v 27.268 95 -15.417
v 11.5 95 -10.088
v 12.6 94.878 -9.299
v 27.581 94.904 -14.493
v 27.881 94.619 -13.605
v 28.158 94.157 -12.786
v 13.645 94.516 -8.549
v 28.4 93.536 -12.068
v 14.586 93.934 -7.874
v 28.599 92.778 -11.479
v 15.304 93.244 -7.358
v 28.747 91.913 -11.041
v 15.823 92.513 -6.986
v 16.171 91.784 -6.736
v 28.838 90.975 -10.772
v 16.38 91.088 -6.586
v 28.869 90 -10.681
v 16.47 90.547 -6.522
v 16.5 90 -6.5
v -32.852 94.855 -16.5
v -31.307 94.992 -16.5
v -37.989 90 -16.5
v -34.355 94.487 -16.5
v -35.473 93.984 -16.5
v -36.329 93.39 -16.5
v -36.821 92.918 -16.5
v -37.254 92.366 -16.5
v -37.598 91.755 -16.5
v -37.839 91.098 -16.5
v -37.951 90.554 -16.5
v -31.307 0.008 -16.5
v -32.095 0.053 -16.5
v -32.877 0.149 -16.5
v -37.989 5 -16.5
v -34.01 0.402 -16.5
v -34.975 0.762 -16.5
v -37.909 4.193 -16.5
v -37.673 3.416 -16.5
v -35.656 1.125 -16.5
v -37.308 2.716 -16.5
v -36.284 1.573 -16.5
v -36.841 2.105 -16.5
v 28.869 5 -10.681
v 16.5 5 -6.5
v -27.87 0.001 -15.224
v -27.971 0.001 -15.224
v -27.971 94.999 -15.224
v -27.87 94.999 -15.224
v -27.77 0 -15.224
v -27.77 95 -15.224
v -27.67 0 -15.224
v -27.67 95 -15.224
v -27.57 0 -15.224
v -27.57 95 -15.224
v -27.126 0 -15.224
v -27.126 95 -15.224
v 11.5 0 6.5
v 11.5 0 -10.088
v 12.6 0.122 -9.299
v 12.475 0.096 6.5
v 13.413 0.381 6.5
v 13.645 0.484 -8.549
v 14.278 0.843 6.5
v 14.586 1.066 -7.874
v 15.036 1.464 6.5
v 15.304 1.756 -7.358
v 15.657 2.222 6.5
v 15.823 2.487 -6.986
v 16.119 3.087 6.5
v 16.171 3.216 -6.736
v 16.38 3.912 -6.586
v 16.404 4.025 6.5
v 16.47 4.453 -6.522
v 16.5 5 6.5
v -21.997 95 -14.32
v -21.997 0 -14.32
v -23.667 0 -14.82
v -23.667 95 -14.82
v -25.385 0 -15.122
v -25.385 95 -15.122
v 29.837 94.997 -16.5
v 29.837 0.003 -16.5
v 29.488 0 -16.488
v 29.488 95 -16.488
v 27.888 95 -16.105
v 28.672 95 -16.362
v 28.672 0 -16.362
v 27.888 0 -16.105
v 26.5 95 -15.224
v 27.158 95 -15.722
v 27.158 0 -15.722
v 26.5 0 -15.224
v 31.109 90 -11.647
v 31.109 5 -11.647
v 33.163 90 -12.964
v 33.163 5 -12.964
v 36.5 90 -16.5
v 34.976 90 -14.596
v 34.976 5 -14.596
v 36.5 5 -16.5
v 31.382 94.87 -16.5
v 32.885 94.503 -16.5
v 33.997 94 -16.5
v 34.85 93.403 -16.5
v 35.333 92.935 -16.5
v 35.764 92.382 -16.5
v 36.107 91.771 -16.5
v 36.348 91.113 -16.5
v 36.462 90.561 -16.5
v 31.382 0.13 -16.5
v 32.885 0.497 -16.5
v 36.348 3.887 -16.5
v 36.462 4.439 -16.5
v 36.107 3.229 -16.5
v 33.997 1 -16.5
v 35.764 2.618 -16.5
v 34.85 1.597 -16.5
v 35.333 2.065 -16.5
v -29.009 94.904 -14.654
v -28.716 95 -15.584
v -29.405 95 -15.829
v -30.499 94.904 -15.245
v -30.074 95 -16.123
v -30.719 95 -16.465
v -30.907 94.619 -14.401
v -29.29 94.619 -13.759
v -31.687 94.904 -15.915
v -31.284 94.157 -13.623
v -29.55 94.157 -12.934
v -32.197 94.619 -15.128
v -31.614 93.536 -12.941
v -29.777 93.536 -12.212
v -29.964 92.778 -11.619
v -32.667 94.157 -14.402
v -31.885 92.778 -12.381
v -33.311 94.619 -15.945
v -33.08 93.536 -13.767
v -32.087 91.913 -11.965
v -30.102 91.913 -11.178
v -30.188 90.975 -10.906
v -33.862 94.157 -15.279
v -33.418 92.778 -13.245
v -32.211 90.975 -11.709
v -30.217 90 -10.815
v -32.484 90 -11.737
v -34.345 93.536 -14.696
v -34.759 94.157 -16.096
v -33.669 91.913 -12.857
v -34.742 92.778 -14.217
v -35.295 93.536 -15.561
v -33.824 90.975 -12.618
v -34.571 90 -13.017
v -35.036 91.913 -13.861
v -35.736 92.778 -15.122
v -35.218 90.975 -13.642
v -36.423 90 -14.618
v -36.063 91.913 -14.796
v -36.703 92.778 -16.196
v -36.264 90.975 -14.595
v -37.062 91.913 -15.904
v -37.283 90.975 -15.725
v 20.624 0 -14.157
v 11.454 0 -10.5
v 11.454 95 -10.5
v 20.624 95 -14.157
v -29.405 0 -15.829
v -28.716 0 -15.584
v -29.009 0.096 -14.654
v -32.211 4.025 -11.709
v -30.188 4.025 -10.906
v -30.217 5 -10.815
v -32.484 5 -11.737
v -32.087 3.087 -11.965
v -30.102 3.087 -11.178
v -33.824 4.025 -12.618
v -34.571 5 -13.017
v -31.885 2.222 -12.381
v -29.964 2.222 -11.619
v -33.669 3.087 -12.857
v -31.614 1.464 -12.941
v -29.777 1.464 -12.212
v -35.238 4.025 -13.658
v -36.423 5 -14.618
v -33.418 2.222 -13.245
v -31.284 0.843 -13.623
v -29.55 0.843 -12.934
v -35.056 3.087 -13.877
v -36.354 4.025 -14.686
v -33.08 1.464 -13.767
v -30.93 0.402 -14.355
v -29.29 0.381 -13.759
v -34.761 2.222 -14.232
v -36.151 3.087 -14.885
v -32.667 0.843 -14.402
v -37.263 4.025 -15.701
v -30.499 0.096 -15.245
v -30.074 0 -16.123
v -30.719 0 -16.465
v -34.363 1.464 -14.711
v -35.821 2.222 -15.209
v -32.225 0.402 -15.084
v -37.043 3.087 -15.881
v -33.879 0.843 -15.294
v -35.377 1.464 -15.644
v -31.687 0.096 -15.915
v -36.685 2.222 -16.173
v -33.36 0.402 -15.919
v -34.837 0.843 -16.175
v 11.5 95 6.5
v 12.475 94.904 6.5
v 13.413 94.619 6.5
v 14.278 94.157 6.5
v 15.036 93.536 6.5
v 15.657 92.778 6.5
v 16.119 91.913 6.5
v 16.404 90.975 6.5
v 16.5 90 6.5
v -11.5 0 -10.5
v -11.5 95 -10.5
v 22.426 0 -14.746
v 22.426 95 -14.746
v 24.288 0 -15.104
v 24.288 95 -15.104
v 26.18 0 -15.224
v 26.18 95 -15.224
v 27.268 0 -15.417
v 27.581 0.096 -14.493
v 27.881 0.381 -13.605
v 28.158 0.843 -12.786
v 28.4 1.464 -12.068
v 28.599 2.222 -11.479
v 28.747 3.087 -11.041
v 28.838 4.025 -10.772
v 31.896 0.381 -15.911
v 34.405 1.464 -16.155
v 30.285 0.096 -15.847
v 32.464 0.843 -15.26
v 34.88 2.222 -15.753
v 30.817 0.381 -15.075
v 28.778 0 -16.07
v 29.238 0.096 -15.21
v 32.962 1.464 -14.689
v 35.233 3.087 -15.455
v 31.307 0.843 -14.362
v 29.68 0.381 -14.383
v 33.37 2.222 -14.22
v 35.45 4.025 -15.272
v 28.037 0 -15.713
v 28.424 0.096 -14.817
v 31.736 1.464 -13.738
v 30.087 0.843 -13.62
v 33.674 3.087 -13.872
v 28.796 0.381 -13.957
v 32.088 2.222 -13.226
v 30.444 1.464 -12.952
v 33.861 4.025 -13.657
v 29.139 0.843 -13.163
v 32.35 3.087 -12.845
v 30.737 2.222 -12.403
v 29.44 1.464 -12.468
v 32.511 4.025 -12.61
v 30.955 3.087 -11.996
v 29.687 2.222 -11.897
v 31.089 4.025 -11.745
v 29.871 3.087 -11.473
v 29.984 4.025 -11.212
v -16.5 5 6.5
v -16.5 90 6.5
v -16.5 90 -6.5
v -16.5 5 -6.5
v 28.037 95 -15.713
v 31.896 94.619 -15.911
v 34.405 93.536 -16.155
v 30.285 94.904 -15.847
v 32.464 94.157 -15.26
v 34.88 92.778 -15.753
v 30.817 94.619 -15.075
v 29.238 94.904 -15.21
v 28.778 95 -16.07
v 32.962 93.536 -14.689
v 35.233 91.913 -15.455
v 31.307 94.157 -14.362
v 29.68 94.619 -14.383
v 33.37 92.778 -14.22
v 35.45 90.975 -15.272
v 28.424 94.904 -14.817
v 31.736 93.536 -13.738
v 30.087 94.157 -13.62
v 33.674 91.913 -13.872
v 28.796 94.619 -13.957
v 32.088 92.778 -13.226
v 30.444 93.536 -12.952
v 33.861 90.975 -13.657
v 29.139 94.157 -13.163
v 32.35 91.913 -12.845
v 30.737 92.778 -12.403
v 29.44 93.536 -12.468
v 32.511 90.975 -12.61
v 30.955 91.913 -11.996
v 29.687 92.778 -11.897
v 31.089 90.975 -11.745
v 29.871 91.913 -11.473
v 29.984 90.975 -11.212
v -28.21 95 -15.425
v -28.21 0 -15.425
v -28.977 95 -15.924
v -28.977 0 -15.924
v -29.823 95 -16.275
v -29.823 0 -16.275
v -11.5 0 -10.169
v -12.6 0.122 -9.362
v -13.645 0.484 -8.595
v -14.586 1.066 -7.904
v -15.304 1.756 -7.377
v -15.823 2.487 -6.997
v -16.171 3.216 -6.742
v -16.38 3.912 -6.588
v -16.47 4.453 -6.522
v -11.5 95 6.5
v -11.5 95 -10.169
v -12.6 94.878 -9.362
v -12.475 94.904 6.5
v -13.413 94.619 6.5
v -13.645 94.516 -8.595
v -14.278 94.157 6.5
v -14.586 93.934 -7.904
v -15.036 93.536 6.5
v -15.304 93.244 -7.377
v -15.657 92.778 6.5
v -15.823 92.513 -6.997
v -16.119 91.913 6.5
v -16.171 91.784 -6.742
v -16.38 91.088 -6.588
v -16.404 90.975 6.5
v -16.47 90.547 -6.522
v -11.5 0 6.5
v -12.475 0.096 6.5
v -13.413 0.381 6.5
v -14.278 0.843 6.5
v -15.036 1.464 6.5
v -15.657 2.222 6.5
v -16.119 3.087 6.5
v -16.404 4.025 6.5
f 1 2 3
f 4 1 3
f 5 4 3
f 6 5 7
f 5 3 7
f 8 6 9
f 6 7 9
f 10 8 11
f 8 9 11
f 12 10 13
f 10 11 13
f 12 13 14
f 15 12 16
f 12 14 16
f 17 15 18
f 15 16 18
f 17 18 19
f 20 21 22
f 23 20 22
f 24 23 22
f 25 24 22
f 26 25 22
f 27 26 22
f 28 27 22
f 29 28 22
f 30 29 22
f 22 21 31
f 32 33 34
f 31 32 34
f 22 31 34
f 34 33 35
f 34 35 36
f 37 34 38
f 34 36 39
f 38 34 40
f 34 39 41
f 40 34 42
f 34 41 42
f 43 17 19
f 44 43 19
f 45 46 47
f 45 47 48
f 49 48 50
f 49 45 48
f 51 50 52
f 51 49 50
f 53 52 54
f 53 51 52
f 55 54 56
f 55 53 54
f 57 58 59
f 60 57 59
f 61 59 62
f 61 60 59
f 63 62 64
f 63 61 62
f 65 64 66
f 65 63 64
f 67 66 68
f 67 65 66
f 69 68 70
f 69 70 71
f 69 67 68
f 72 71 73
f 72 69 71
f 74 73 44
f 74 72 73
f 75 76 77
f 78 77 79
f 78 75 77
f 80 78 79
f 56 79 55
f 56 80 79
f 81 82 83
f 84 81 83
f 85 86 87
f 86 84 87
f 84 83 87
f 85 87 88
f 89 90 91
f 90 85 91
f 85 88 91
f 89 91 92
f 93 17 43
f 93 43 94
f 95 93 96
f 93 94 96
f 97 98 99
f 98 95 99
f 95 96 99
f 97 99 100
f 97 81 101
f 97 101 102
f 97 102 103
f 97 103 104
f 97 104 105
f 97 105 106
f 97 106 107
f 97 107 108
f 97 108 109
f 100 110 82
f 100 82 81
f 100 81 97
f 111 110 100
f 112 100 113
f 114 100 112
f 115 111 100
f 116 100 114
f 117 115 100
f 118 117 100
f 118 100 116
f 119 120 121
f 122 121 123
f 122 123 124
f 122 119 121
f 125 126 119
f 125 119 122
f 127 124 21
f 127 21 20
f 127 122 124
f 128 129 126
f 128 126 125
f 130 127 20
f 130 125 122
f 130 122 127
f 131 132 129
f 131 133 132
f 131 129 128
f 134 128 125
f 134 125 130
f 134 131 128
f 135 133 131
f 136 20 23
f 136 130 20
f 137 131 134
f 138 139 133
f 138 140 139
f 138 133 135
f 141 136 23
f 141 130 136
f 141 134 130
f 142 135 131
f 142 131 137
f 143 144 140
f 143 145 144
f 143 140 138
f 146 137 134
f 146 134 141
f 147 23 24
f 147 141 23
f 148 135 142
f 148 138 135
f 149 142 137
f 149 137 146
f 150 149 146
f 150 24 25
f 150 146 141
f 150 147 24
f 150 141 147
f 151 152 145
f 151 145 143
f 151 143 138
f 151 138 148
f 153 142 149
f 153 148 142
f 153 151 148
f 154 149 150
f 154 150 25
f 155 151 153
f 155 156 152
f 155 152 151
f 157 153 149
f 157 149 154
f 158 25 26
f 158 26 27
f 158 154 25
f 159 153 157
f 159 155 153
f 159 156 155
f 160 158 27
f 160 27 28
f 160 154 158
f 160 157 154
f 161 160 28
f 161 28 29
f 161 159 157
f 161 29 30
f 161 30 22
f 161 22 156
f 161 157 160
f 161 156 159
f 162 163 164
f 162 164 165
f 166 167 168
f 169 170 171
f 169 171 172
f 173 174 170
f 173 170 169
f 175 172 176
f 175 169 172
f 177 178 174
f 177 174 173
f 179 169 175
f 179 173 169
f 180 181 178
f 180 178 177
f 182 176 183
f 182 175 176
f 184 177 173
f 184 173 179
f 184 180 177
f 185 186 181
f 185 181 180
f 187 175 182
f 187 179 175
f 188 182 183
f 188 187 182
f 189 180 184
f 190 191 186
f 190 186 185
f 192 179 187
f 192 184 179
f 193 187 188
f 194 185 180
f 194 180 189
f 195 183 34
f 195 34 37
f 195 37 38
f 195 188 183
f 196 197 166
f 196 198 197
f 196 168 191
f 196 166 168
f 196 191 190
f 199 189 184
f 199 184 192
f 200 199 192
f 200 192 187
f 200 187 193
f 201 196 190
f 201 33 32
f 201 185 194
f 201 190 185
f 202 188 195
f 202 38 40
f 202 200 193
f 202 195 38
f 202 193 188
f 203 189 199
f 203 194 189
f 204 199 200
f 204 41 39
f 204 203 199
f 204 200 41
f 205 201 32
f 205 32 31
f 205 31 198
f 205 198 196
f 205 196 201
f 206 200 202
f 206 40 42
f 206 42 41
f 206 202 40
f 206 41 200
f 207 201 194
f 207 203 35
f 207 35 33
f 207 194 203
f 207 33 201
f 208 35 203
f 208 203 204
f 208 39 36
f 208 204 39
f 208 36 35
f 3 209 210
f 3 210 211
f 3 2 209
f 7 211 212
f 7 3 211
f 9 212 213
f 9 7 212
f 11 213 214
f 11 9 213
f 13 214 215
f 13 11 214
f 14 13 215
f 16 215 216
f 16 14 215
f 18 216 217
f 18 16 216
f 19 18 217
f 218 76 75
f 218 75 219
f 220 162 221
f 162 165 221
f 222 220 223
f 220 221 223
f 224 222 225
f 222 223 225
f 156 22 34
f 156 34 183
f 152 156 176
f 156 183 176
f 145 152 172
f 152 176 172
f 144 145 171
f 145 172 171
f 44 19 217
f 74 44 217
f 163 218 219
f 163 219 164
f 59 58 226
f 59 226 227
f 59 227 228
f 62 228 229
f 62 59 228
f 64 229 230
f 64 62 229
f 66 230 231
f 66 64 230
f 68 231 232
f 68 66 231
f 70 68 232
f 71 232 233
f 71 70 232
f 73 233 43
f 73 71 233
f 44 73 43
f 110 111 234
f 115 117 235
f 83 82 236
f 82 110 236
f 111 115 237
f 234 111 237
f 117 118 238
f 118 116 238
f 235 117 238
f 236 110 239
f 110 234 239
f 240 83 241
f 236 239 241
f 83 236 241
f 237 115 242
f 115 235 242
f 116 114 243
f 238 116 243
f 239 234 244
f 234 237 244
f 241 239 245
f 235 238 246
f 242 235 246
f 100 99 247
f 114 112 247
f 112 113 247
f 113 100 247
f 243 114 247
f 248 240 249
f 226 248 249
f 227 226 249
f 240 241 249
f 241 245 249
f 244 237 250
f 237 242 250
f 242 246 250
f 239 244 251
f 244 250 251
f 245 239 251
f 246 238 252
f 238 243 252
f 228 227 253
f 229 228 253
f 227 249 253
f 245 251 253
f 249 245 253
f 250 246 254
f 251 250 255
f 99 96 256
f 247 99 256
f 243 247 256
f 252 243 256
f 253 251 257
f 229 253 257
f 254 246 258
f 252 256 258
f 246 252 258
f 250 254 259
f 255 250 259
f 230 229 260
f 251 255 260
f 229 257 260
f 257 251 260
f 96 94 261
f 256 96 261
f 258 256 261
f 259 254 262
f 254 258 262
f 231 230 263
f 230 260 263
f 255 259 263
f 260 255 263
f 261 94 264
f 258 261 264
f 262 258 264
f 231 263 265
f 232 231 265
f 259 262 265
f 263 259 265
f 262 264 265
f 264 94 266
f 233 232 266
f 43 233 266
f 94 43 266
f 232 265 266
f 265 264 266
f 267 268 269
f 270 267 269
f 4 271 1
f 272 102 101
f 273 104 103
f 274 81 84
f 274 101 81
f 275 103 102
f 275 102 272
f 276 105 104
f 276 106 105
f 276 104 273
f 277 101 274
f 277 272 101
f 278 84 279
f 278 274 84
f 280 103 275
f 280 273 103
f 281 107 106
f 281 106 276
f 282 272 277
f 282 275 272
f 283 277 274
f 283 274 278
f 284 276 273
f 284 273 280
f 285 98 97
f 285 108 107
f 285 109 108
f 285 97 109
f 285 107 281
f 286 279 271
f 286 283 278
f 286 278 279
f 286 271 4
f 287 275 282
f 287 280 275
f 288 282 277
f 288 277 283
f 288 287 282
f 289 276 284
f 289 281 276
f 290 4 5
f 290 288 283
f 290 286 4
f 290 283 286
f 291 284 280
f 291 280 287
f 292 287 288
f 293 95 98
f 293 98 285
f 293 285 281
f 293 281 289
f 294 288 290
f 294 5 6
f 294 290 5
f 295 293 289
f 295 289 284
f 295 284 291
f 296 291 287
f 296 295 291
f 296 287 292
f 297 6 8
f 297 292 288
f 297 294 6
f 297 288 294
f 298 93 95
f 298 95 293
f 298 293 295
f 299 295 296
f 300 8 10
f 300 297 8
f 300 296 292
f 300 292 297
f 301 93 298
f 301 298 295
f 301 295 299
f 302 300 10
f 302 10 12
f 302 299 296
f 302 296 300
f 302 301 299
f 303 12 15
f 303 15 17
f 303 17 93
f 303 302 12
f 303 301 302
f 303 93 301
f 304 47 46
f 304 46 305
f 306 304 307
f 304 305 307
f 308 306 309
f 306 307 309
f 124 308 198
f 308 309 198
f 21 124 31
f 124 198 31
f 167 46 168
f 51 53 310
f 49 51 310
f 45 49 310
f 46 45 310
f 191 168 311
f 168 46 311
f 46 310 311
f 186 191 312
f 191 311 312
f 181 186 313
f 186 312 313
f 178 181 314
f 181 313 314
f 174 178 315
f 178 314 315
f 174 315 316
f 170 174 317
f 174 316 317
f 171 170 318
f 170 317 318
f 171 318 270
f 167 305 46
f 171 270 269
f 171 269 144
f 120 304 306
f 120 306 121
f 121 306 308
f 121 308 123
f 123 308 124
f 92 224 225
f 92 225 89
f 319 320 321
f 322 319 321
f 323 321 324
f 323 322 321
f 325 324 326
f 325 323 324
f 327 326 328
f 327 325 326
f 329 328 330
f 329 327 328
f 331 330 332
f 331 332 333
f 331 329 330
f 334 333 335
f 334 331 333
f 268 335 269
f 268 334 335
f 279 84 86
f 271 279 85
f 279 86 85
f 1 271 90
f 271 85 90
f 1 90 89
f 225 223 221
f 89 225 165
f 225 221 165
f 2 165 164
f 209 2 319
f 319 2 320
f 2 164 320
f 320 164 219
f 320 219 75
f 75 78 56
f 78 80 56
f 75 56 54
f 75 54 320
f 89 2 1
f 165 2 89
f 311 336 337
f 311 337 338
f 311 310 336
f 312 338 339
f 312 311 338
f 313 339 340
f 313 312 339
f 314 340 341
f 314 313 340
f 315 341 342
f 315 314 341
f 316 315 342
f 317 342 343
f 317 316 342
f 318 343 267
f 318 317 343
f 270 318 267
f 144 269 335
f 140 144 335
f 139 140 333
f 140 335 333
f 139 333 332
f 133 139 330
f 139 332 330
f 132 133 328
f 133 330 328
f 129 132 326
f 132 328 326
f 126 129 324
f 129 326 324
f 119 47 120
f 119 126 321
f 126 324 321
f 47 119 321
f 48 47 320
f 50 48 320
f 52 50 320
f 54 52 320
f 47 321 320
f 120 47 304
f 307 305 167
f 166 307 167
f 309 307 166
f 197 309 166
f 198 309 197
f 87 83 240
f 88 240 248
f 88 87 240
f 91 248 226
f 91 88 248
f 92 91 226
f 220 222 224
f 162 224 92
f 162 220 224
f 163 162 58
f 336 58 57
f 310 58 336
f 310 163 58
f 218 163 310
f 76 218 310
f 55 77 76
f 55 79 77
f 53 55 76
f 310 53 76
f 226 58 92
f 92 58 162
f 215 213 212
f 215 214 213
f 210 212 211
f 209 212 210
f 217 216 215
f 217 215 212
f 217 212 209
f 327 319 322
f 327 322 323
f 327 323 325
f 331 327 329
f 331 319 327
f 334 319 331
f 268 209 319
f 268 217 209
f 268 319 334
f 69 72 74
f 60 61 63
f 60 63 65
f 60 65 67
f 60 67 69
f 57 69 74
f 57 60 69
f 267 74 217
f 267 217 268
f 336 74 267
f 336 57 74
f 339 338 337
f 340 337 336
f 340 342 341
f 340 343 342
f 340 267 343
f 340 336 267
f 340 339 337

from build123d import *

# Parameters (mm, degrees)
BOSS_EXTRUDE5_DEPTH = 95
FILLET16_R          = 15
FILLET17_R          = 15
FILLET18_R          = 15
FILLET19_R          = 15
FILLET21_R          = 5
FILLET22_R          = 5
FILLET23_R          = 5
FILLET24_R          = 5
FILLET25_R          = 5
FILLET26_R          = 5
FILLET28_R          = 5
FILLET29_R          = 5
FILLET30_R          = 5
FILLET31_R          = 5


with BuildPart() as part:
    # Sketch2 → Boss-Extrude5 (new body)
    with BuildSketch(Plane(origin=(0, 0, 0), x_dir=(1, 0, 0), z_dir=(0, 1, 0))):
        Polygon((-11.5, 10.5), (11.453517933, 10.5), (23.299541019, 15.223771191), (26.5, 15.223771191), (26.5, 16.5), (36.5, 16.5), (36.5, 13.259608353), (16.5, 6.5), (16.5, -6.5), (-16.5, -6.5), (-16.5, 6.5), (-37.988921901, 13.259608353), (-37.988921901, 16.5), (-27.988921901, 16.5), (-27.970531324, 16.5), (-27.970531324, 16.440454109), (-27.970531324, 15.223771191), (-24.481649041, 15.223771191), align=None)
    extrude(amount=BOSS_EXTRUDE5_DEPTH)

    # Fillet16
    # the kernel refuses this fillet: 15 mm, written as the material it takes off along each edge
    with BuildSketch(Plane(origin=(36.5, -20.136972883, -13.259608353), x_dir=(-0.9473542933434234, 0, 0.3201871997500573), z_dir=(0, 1, 0))) as fillet16_piece_1:
        with BuildLine():
            CenterArc((8.054789153, -15), FILLET16_R, 90, 37.311981857)
            Line((-1.037531927, -3.069798938), (-1.219378349, -2.831194917))
            ThreePointArc((-1.219378349, -2.831194917), (-0.802972252, -1.438843309), (-0.284206288, 0.09605616))
            Line((-0.284206288, 0.09605616), (0, 0.3))
            Line((0, 0.3), (8.054789153, 0.3))
            Line((8.054789153, 0.3), (8.054789153, 0))
        make_face()
    extrude(amount=135.273945765, mode=Mode.SUBTRACT)

    # Fillet17
    # the kernel refuses this fillet: 15 mm, written as the material it takes off along each edge
    with BuildSketch(Plane(origin=(-37.988921901, -20.369568994, -13.259608353), x_dir=(0, 0, -1), z_dir=(0, 1, 0))) as fillet17_piece_1:
        with BuildLine():
            CenterArc((11.863879582, -12.273363672), FILLET17_R, 125.092573115, 37.445808138)
            Line((-2.444893018, -7.772360819), (-2.73106847, -7.682340761))
            Line((-2.73106847, -7.682340761), (-0.286175452, 0.090020057))
            Line((-0.286175452, 0.090020057), (0, 0.3))
            ThreePointArc((0, 0.3), (1.620195823, 0.3), (3.067921888, 0.245467273))
            Line((3.067921888, 0.245467273), (3.240391647, 0))
        make_face()
    extrude(amount=135.739137989, mode=Mode.SUBTRACT)

    # Fillet18
    fillet18_edges = [part.edges().sort_by_distance(p)[0] for p in [
        (23.299541019, 47.5, -15.223771191),
    ]]
    fillet(fillet18_edges, radius=FILLET18_R)

    # Fillet19
    fillet19_edges = [part.edges().sort_by_distance(p)[0] for p in [
        (-24.481649041, 47.5, -15.223771191),
    ]]
    fillet(fillet19_edges, radius=FILLET19_R)

    # Fillet21
    # the kernel refuses this fillet: 5 mm, written as the material it takes off along each edge
    with BuildSketch(Plane(origin=(26.5, -8.341735474, -16.5), x_dir=(0, 0, 1), z_dir=(0, 1, 0))) as fillet21_piece_1:
        with BuildLine():
            CenterArc((5, 3.33669419), FILLET21_R, 180, 41.862005804)
            Line((0, 3.33669419), (-0.1, 3.33669419))
            Line((-0.1, 3.33669419), (-0.1, 0))
            Line((-0.1, 0), (0, -0.1))
            ThreePointArc((0, -0.1), (0.638114404, -0.1), (1.201753385, -0.066733884))
            Line((1.201753385, -0.066733884), (1.276228809, 0))
        make_face()
    extrude(amount=111.683470949, mode=Mode.SUBTRACT)

    # Fillet22
    # the kernel refuses this fillet: 5 mm, written as the material it takes off along each edge
    with BuildSketch(Plane(origin=(-27.970531324, -8.341735474, -16.5), x_dir=(0, 0, 1), z_dir=(0, 1, 0))) as fillet22_piece_1:
        with BuildLine():
            CenterArc((5, -3.33669419), FILLET22_R, 138.137994196, 41.862005804)
            Line((0, -3.33669419), (-0.1, -3.33669419))
            Line((-0.1, -3.33669419), (-0.1, 0))
            Line((-0.1, 0), (0, 0.1))
            ThreePointArc((0, 0.1), (0.638114404, 0.1), (1.201753385, 0.066733884))
            Line((1.201753385, 0.066733884), (1.276228809, 0))
        make_face()
    extrude(amount=111.683470949, mode=Mode.SUBTRACT)

    # Fillet23
    # the kernel refuses this fillet: 5 mm, written as the material it takes off along each edge
    with BuildSketch(Plane(origin=(-4.576022833, 0, -2.749164289), x_dir=(0.3000668568991913, 0, -0.9539181733202489), z_dir=(-0.9539181733202489, 0, -0.3000668568991913))) as fillet23_piece_1_section:
        with BuildLine():
            CenterArc((FILLET23_R, -FILLET23_R), FILLET23_R, 90, 90)
            Line((0, -FILLET23_R), (-FILLET23_R * 0.02, -FILLET23_R))
            Line((-FILLET23_R * 0.02, -FILLET23_R), (-FILLET23_R * 0.02, FILLET23_R * 0.02))
            Line((-FILLET23_R * 0.02, FILLET23_R * 0.02), (FILLET23_R, FILLET23_R * 0.02))
            Line((FILLET23_R, FILLET23_R * 0.02), (FILLET23_R, 0))
        make_face()
    fillet23_piece_1 = extrude(amount=26.879179961, mode=Mode.PRIVATE)
    fillet23_piece_1 = split(fillet23_piece_1, bisect_by=Plane(origin=(-16.5, 1.14737311, -9.7645004), z_dir=(-1, 0, 0)), keep=Keep.TOP, mode=Mode.PRIVATE)
    add(fillet23_piece_1, mode=Mode.SUBTRACT)
    with BuildSketch(Plane(origin=(-25.715558229, 0, -25.123487935), x_dir=(-0.3000668568991974, 0, 0.9539181733202469), z_dir=(0.9539181733202469, 0, 0.3000668568991974))) as fillet23_piece_2_section:
        with BuildLine():
            CenterArc((15 - FILLET23_R, -FILLET23_R), FILLET23_R, 0, 90)
            Line((15, -FILLET23_R), (15 + FILLET23_R * 0.02, -FILLET23_R))
            Line((15 + FILLET23_R * 0.02, -FILLET23_R), (15 + FILLET23_R * 0.02, FILLET23_R * 0.02))
            Line((15 + FILLET23_R * 0.02, FILLET23_R * 0.02), (15 - FILLET23_R, FILLET23_R * 0.02))
            Line((15 - FILLET23_R, FILLET23_R * 0.02), (15 - FILLET23_R, 0))
        make_face()
    fillet23_piece_2 = revolve(axis=Axis((-25.715558229, 0, -25.123487935), (0, -1, 0)), revolution_arc=85.195610564, mode=Mode.PRIVATE)
    fillet23_piece_2 = split(fillet23_piece_2, bisect_by=Plane(origin=(-33.617328681, 1.250053693, -16.5), z_dir=(0, 0, 1)), keep=Keep.TOP, mode=Mode.PRIVATE)
    add(fillet23_piece_2, mode=Mode.SUBTRACT)

    # Fillet24
    fillet24_edges = [part.edges().sort_by_distance(p)[0] for p in [
        (22.684630457, 0, -8.590283985),
        (33.162574695, 0, -12.963578877),
    ]]
    fillet(fillet24_edges, radius=FILLET24_R)

    # Fillet25
    fillet25_edges = [part.edges().sort_by_distance(p)[0] for p in [
        (33.162574695, 95, -12.963578877),
        (22.684630457, 95, -8.590283985),
    ]]
    fillet(fillet25_edges, radius=FILLET25_R)

    # Fillet26
    # the kernel refuses this fillet: 5 mm, written as the material it takes off along each edge
    with BuildSketch(Plane(origin=(-25.715558229, 95, -25.123487935), x_dir=(-0.3000668568991974, 0, 0.9539181733202469), z_dir=(0.9539181733202469, 0, 0.3000668568991974))) as fillet26_piece_1:
        with BuildLine():
            CenterArc((15 - FILLET26_R, FILLET26_R), FILLET26_R, 270, 90)
            Line((15, FILLET26_R), (15, 0))
            Line((15, 0), (15 - FILLET26_R, 0))
        make_face()
    revolve(axis=Axis((-25.715558229, 95, -25.123487935), (0, -1, 0)), revolution_arc=85.195610564, mode=Mode.SUBTRACT)
    with BuildSketch(Plane(origin=(-4.576022833, 95, -2.749164289), x_dir=(0.3000668568991913, 0, -0.9539181733202489), z_dir=(-0.9539181733202489, 0, -0.3000668568991913))) as fillet26_piece_2_section:
        with BuildLine():
            CenterArc((FILLET26_R, FILLET26_R), FILLET26_R, 180, 90)
            Line((0, FILLET26_R), (0, 0))
            Line((0, 0), (FILLET26_R, 0))
        make_face()
    fillet26_piece_2 = extrude(amount=26.879179961, mode=Mode.PRIVATE)
    fillet26_piece_2 = split(fillet26_piece_2, bisect_by=Plane(origin=(-16.5, 93.85262689, -9.7645004), z_dir=(-1, 0, 0)), keep=Keep.TOP, mode=Mode.PRIVATE)
    add(fillet26_piece_2, mode=Mode.SUBTRACT)

    # Fillet28
    fillet28_edges = [part.edges().sort_by_distance(p)[0] for p in [
        (16.5, 0, -2.638928242),
    ]]
    fillet(fillet28_edges, radius=FILLET28_R)

    # Fillet29
    fillet29_edges = [part.edges().sort_by_distance(p)[0] for p in [
        (-16.5, 0, -2.620769863),
    ]]
    fillet(fillet29_edges, radius=FILLET29_R)

    # Fillet30
    fillet30_edges = [part.edges().sort_by_distance(p)[0] for p in [
        (-16.5, 95, -2.620769863),
    ]]
    fillet(fillet30_edges, radius=FILLET30_R)

    # Fillet31
    fillet31_edges = [part.edges().sort_by_distance(p)[0] for p in [
        (16.5, 95, -2.638928242),
    ]]
    fillet(fillet31_edges, radius=FILLET31_R)


solid = part.part
